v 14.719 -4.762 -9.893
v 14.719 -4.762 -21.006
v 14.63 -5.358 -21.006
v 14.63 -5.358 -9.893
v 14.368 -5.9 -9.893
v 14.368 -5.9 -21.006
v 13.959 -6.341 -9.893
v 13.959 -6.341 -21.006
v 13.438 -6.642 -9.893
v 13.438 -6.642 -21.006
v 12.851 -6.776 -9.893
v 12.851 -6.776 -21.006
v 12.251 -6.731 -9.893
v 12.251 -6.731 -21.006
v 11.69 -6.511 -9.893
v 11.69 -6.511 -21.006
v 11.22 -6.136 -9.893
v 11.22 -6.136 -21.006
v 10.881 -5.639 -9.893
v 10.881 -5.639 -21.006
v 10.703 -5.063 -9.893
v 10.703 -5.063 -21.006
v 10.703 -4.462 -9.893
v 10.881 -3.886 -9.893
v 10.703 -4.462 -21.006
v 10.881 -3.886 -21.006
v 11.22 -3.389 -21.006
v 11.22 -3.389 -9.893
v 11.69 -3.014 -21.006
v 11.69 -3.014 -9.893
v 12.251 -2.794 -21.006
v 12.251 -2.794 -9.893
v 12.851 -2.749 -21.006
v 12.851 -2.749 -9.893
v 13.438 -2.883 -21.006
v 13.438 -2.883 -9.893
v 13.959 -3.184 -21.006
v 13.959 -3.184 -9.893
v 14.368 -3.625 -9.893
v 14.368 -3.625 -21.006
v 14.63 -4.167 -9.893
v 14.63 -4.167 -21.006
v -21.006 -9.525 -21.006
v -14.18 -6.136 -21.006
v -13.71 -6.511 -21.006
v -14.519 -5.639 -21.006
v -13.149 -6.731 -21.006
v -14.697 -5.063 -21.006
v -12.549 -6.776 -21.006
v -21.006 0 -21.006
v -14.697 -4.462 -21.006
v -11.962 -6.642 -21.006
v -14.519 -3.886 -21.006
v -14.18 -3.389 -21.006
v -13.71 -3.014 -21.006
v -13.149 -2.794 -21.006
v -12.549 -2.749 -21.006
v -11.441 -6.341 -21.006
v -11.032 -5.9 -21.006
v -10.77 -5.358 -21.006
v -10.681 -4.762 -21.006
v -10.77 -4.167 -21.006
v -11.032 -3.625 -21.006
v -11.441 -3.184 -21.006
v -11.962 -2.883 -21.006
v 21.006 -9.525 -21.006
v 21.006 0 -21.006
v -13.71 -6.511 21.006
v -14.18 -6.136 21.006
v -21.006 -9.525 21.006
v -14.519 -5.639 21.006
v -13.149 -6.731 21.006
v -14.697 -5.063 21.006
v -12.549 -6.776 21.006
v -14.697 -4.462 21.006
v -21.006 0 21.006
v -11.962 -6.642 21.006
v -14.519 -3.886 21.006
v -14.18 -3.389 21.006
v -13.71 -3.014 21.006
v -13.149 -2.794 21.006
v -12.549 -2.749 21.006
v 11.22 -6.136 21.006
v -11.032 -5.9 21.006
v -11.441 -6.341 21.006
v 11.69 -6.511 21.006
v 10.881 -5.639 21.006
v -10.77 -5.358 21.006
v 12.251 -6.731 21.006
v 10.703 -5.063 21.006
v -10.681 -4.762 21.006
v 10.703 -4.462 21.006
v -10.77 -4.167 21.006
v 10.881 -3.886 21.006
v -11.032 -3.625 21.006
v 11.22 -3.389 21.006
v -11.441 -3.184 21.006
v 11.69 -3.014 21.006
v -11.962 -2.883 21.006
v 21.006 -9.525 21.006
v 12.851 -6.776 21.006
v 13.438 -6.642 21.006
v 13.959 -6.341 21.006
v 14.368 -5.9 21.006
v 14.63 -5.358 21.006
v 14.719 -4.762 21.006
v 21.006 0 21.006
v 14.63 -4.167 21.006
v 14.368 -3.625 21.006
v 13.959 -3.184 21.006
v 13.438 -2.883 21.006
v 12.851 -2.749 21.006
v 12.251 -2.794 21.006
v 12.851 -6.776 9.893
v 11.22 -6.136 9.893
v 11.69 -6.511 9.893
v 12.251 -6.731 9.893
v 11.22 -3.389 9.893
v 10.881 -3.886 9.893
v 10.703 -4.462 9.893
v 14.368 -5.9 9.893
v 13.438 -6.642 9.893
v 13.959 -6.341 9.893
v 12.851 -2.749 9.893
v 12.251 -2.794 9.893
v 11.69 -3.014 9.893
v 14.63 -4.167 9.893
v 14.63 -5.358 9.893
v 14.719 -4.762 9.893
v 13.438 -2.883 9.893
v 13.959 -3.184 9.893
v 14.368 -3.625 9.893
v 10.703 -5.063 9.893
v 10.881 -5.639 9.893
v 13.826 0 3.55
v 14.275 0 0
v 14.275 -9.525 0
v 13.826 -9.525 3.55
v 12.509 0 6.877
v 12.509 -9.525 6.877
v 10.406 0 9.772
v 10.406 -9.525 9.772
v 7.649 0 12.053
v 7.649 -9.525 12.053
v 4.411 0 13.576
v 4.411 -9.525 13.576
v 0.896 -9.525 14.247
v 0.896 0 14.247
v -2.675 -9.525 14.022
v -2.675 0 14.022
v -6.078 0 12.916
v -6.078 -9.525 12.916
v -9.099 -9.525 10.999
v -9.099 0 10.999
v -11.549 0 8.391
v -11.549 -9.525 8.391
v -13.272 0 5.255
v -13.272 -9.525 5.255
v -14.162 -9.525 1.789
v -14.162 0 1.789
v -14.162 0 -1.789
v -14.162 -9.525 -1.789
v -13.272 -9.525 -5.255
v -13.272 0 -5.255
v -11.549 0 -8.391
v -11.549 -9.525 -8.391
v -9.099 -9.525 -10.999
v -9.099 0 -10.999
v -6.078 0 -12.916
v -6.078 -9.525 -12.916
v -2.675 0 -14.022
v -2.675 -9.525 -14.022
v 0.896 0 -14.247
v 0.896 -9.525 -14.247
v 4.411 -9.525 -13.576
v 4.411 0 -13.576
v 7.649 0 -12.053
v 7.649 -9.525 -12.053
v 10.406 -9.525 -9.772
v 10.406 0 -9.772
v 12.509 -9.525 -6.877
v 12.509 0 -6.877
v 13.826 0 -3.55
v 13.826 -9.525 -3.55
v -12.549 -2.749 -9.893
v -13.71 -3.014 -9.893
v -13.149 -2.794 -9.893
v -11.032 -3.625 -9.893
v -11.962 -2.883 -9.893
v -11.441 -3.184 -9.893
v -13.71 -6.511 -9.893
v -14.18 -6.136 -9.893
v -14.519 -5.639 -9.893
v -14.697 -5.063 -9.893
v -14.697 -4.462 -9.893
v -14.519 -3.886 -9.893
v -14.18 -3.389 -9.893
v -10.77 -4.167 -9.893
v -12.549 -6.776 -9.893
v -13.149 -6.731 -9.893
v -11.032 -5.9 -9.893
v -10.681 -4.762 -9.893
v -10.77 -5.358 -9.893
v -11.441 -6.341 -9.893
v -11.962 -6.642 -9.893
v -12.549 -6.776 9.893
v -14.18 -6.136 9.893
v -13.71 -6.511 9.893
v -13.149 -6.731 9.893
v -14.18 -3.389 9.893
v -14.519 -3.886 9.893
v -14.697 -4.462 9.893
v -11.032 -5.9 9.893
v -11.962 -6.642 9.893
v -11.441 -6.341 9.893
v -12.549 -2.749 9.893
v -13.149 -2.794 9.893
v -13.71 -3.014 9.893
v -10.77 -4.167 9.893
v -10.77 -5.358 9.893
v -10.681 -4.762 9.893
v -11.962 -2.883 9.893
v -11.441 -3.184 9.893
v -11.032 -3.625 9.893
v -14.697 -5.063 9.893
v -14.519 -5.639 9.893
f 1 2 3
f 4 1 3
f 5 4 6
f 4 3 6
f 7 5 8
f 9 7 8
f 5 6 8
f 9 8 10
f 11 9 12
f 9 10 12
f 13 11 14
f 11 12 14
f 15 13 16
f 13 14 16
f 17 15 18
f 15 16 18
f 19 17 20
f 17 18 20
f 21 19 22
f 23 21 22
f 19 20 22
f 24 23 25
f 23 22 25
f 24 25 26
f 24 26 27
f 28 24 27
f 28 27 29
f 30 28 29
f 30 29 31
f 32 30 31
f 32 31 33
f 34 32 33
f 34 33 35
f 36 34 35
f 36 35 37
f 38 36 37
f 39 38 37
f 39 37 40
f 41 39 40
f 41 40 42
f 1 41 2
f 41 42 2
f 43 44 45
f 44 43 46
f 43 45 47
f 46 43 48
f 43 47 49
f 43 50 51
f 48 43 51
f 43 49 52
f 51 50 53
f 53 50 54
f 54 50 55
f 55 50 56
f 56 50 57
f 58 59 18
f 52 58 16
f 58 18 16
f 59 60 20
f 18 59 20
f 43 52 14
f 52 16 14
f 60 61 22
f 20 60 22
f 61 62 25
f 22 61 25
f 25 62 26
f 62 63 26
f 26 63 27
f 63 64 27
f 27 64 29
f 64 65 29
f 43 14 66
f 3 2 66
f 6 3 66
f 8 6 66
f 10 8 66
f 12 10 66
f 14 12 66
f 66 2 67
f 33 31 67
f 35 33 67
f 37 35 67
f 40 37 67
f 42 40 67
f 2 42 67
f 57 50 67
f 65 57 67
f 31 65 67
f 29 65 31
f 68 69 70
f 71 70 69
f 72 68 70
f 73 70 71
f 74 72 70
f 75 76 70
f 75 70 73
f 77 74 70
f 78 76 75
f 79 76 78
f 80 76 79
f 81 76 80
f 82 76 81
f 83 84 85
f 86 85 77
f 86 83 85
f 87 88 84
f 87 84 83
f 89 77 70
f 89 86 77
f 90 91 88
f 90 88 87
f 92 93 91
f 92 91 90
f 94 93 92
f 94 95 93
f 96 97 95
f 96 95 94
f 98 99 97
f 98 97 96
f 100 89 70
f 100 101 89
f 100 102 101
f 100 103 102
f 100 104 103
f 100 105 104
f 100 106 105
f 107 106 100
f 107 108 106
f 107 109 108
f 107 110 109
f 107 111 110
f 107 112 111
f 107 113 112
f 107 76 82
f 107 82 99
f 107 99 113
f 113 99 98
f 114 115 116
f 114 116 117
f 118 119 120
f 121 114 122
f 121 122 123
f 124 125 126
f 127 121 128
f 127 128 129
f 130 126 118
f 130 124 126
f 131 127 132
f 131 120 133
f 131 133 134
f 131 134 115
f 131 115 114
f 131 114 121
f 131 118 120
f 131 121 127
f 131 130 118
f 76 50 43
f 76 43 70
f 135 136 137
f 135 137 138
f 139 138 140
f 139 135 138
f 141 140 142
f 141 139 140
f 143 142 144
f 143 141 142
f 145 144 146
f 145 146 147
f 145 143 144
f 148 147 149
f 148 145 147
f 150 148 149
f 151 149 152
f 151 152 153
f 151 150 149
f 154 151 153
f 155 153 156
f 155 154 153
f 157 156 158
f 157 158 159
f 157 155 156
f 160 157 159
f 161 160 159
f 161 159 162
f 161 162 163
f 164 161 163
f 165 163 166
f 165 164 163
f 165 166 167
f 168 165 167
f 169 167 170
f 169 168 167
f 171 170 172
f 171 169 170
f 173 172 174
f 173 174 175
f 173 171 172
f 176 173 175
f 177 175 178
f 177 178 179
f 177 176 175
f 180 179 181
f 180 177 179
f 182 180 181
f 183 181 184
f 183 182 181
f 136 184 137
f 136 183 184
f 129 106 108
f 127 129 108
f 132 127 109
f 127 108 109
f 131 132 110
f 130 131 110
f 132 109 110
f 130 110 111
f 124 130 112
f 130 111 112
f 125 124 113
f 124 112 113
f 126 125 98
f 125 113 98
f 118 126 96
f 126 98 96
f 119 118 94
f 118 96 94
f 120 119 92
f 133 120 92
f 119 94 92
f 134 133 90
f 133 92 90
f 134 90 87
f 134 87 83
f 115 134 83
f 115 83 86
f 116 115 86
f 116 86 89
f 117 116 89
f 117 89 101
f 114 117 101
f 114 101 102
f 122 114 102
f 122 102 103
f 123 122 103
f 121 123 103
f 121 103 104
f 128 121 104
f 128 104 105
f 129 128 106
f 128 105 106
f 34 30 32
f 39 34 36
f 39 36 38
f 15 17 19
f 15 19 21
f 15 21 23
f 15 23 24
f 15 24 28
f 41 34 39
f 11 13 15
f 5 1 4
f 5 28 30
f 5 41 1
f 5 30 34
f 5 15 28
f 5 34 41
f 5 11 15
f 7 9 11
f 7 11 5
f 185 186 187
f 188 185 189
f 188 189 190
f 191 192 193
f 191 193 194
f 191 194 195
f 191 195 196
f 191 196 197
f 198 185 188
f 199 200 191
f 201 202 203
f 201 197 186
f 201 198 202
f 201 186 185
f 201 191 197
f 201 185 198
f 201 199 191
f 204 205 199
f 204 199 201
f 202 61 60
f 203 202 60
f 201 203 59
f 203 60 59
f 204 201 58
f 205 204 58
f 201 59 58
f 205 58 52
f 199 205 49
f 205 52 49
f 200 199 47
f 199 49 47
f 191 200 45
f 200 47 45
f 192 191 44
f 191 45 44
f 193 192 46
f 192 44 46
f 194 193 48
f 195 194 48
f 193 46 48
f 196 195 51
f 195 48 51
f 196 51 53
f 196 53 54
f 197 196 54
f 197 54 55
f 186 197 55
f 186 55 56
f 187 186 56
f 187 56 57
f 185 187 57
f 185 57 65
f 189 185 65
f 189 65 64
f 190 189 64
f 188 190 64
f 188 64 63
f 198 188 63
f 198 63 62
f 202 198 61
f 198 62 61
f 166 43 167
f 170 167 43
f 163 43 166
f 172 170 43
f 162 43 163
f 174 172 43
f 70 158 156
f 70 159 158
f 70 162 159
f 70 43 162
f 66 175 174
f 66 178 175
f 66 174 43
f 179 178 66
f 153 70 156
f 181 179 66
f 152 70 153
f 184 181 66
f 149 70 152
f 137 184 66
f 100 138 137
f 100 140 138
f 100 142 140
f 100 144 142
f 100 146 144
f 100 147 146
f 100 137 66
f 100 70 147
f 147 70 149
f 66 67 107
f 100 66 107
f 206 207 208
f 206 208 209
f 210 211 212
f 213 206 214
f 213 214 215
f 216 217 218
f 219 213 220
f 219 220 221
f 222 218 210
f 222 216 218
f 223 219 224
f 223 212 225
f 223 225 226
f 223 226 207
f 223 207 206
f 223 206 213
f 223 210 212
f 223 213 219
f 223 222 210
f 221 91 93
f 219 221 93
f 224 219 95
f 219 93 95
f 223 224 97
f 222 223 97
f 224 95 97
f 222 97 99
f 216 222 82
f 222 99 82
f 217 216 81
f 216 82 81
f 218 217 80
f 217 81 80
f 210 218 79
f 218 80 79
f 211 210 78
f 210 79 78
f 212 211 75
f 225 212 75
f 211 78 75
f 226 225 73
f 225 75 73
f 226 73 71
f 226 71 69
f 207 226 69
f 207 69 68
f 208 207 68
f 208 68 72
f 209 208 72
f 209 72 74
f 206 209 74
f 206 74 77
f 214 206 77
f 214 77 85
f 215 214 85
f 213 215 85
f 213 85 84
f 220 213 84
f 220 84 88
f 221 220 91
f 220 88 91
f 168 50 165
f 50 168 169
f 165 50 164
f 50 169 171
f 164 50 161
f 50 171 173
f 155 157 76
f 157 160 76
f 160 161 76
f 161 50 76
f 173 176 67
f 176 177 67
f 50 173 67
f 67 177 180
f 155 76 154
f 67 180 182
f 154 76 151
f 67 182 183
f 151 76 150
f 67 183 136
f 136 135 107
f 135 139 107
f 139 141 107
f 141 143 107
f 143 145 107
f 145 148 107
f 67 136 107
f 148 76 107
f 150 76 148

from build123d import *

# Parameters (mm, degrees)
F0_W     = 42.0116
F0_H     = 42.0116
F0_R     = 14.2748
F1_DEPTH = 9.525
F2_R     = 2.0193
F3_DEPTH = 11.1125
F4_R     = 2.0193
F5_DEPTH = 11.1125


with BuildPart() as f1:
    # F0 (on Front) → F1 (new body)
    with BuildSketch(Plane.XZ):
        Rectangle(F0_W, F0_H)
        Circle(F0_R, mode=Mode.SUBTRACT)
    extrude(amount=F1_DEPTH)

    # F2 (on face) → F3 (cut)
    with BuildSketch(Plane.XY.offset(21.0058)):
        with Locations((-12.7, -4.7625)):
            Circle(F2_R)
        with Locations((12.7, -4.7625)):
            Circle(F2_R)
    extrude(amount=-F3_DEPTH, mode=Mode.SUBTRACT)

    # F4 (on face) → F5 (cut)
    with BuildSketch(Plane(origin=(0, 0, -21.0058), x_dir=(1, 0, 0), z_dir=(0, 0, -1))):
        with Locations((-12.7, 4.7625)):
            Circle(F4_R)
        with Locations((12.7, 4.7625)):
            Circle(F4_R)
    extrude(amount=-F5_DEPTH, mode=Mode.SUBTRACT)


solid = f1.part
